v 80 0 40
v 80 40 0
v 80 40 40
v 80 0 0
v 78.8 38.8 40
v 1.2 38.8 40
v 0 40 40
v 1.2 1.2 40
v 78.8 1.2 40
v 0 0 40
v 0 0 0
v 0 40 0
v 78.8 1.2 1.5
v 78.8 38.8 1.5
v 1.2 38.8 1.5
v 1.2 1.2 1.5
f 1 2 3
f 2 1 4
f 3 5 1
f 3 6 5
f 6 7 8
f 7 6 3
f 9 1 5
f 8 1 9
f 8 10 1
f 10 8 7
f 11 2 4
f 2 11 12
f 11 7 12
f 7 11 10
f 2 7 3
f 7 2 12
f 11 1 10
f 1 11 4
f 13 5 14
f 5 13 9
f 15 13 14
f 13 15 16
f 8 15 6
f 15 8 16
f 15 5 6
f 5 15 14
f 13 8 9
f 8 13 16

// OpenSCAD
$fn = 32;

// ----------------------------------------------------------------------
// Open box: 1.2 mm walls
// ----------------------------------------------------------------------

// --- parameters (mm) ---
box_l = 80;               // outer length, X
box_w = 40;               // outer width, Y
box_h = 40;               // outer height, Z
wall = 1.2;               // wall thickness
floor = 1.5;              // floor thickness

difference() {
  cube([box_l, box_w, box_h]);
  translate([wall, wall, floor])
    cube([box_l - 2 * wall, box_w - 2 * wall, box_h]);
}
